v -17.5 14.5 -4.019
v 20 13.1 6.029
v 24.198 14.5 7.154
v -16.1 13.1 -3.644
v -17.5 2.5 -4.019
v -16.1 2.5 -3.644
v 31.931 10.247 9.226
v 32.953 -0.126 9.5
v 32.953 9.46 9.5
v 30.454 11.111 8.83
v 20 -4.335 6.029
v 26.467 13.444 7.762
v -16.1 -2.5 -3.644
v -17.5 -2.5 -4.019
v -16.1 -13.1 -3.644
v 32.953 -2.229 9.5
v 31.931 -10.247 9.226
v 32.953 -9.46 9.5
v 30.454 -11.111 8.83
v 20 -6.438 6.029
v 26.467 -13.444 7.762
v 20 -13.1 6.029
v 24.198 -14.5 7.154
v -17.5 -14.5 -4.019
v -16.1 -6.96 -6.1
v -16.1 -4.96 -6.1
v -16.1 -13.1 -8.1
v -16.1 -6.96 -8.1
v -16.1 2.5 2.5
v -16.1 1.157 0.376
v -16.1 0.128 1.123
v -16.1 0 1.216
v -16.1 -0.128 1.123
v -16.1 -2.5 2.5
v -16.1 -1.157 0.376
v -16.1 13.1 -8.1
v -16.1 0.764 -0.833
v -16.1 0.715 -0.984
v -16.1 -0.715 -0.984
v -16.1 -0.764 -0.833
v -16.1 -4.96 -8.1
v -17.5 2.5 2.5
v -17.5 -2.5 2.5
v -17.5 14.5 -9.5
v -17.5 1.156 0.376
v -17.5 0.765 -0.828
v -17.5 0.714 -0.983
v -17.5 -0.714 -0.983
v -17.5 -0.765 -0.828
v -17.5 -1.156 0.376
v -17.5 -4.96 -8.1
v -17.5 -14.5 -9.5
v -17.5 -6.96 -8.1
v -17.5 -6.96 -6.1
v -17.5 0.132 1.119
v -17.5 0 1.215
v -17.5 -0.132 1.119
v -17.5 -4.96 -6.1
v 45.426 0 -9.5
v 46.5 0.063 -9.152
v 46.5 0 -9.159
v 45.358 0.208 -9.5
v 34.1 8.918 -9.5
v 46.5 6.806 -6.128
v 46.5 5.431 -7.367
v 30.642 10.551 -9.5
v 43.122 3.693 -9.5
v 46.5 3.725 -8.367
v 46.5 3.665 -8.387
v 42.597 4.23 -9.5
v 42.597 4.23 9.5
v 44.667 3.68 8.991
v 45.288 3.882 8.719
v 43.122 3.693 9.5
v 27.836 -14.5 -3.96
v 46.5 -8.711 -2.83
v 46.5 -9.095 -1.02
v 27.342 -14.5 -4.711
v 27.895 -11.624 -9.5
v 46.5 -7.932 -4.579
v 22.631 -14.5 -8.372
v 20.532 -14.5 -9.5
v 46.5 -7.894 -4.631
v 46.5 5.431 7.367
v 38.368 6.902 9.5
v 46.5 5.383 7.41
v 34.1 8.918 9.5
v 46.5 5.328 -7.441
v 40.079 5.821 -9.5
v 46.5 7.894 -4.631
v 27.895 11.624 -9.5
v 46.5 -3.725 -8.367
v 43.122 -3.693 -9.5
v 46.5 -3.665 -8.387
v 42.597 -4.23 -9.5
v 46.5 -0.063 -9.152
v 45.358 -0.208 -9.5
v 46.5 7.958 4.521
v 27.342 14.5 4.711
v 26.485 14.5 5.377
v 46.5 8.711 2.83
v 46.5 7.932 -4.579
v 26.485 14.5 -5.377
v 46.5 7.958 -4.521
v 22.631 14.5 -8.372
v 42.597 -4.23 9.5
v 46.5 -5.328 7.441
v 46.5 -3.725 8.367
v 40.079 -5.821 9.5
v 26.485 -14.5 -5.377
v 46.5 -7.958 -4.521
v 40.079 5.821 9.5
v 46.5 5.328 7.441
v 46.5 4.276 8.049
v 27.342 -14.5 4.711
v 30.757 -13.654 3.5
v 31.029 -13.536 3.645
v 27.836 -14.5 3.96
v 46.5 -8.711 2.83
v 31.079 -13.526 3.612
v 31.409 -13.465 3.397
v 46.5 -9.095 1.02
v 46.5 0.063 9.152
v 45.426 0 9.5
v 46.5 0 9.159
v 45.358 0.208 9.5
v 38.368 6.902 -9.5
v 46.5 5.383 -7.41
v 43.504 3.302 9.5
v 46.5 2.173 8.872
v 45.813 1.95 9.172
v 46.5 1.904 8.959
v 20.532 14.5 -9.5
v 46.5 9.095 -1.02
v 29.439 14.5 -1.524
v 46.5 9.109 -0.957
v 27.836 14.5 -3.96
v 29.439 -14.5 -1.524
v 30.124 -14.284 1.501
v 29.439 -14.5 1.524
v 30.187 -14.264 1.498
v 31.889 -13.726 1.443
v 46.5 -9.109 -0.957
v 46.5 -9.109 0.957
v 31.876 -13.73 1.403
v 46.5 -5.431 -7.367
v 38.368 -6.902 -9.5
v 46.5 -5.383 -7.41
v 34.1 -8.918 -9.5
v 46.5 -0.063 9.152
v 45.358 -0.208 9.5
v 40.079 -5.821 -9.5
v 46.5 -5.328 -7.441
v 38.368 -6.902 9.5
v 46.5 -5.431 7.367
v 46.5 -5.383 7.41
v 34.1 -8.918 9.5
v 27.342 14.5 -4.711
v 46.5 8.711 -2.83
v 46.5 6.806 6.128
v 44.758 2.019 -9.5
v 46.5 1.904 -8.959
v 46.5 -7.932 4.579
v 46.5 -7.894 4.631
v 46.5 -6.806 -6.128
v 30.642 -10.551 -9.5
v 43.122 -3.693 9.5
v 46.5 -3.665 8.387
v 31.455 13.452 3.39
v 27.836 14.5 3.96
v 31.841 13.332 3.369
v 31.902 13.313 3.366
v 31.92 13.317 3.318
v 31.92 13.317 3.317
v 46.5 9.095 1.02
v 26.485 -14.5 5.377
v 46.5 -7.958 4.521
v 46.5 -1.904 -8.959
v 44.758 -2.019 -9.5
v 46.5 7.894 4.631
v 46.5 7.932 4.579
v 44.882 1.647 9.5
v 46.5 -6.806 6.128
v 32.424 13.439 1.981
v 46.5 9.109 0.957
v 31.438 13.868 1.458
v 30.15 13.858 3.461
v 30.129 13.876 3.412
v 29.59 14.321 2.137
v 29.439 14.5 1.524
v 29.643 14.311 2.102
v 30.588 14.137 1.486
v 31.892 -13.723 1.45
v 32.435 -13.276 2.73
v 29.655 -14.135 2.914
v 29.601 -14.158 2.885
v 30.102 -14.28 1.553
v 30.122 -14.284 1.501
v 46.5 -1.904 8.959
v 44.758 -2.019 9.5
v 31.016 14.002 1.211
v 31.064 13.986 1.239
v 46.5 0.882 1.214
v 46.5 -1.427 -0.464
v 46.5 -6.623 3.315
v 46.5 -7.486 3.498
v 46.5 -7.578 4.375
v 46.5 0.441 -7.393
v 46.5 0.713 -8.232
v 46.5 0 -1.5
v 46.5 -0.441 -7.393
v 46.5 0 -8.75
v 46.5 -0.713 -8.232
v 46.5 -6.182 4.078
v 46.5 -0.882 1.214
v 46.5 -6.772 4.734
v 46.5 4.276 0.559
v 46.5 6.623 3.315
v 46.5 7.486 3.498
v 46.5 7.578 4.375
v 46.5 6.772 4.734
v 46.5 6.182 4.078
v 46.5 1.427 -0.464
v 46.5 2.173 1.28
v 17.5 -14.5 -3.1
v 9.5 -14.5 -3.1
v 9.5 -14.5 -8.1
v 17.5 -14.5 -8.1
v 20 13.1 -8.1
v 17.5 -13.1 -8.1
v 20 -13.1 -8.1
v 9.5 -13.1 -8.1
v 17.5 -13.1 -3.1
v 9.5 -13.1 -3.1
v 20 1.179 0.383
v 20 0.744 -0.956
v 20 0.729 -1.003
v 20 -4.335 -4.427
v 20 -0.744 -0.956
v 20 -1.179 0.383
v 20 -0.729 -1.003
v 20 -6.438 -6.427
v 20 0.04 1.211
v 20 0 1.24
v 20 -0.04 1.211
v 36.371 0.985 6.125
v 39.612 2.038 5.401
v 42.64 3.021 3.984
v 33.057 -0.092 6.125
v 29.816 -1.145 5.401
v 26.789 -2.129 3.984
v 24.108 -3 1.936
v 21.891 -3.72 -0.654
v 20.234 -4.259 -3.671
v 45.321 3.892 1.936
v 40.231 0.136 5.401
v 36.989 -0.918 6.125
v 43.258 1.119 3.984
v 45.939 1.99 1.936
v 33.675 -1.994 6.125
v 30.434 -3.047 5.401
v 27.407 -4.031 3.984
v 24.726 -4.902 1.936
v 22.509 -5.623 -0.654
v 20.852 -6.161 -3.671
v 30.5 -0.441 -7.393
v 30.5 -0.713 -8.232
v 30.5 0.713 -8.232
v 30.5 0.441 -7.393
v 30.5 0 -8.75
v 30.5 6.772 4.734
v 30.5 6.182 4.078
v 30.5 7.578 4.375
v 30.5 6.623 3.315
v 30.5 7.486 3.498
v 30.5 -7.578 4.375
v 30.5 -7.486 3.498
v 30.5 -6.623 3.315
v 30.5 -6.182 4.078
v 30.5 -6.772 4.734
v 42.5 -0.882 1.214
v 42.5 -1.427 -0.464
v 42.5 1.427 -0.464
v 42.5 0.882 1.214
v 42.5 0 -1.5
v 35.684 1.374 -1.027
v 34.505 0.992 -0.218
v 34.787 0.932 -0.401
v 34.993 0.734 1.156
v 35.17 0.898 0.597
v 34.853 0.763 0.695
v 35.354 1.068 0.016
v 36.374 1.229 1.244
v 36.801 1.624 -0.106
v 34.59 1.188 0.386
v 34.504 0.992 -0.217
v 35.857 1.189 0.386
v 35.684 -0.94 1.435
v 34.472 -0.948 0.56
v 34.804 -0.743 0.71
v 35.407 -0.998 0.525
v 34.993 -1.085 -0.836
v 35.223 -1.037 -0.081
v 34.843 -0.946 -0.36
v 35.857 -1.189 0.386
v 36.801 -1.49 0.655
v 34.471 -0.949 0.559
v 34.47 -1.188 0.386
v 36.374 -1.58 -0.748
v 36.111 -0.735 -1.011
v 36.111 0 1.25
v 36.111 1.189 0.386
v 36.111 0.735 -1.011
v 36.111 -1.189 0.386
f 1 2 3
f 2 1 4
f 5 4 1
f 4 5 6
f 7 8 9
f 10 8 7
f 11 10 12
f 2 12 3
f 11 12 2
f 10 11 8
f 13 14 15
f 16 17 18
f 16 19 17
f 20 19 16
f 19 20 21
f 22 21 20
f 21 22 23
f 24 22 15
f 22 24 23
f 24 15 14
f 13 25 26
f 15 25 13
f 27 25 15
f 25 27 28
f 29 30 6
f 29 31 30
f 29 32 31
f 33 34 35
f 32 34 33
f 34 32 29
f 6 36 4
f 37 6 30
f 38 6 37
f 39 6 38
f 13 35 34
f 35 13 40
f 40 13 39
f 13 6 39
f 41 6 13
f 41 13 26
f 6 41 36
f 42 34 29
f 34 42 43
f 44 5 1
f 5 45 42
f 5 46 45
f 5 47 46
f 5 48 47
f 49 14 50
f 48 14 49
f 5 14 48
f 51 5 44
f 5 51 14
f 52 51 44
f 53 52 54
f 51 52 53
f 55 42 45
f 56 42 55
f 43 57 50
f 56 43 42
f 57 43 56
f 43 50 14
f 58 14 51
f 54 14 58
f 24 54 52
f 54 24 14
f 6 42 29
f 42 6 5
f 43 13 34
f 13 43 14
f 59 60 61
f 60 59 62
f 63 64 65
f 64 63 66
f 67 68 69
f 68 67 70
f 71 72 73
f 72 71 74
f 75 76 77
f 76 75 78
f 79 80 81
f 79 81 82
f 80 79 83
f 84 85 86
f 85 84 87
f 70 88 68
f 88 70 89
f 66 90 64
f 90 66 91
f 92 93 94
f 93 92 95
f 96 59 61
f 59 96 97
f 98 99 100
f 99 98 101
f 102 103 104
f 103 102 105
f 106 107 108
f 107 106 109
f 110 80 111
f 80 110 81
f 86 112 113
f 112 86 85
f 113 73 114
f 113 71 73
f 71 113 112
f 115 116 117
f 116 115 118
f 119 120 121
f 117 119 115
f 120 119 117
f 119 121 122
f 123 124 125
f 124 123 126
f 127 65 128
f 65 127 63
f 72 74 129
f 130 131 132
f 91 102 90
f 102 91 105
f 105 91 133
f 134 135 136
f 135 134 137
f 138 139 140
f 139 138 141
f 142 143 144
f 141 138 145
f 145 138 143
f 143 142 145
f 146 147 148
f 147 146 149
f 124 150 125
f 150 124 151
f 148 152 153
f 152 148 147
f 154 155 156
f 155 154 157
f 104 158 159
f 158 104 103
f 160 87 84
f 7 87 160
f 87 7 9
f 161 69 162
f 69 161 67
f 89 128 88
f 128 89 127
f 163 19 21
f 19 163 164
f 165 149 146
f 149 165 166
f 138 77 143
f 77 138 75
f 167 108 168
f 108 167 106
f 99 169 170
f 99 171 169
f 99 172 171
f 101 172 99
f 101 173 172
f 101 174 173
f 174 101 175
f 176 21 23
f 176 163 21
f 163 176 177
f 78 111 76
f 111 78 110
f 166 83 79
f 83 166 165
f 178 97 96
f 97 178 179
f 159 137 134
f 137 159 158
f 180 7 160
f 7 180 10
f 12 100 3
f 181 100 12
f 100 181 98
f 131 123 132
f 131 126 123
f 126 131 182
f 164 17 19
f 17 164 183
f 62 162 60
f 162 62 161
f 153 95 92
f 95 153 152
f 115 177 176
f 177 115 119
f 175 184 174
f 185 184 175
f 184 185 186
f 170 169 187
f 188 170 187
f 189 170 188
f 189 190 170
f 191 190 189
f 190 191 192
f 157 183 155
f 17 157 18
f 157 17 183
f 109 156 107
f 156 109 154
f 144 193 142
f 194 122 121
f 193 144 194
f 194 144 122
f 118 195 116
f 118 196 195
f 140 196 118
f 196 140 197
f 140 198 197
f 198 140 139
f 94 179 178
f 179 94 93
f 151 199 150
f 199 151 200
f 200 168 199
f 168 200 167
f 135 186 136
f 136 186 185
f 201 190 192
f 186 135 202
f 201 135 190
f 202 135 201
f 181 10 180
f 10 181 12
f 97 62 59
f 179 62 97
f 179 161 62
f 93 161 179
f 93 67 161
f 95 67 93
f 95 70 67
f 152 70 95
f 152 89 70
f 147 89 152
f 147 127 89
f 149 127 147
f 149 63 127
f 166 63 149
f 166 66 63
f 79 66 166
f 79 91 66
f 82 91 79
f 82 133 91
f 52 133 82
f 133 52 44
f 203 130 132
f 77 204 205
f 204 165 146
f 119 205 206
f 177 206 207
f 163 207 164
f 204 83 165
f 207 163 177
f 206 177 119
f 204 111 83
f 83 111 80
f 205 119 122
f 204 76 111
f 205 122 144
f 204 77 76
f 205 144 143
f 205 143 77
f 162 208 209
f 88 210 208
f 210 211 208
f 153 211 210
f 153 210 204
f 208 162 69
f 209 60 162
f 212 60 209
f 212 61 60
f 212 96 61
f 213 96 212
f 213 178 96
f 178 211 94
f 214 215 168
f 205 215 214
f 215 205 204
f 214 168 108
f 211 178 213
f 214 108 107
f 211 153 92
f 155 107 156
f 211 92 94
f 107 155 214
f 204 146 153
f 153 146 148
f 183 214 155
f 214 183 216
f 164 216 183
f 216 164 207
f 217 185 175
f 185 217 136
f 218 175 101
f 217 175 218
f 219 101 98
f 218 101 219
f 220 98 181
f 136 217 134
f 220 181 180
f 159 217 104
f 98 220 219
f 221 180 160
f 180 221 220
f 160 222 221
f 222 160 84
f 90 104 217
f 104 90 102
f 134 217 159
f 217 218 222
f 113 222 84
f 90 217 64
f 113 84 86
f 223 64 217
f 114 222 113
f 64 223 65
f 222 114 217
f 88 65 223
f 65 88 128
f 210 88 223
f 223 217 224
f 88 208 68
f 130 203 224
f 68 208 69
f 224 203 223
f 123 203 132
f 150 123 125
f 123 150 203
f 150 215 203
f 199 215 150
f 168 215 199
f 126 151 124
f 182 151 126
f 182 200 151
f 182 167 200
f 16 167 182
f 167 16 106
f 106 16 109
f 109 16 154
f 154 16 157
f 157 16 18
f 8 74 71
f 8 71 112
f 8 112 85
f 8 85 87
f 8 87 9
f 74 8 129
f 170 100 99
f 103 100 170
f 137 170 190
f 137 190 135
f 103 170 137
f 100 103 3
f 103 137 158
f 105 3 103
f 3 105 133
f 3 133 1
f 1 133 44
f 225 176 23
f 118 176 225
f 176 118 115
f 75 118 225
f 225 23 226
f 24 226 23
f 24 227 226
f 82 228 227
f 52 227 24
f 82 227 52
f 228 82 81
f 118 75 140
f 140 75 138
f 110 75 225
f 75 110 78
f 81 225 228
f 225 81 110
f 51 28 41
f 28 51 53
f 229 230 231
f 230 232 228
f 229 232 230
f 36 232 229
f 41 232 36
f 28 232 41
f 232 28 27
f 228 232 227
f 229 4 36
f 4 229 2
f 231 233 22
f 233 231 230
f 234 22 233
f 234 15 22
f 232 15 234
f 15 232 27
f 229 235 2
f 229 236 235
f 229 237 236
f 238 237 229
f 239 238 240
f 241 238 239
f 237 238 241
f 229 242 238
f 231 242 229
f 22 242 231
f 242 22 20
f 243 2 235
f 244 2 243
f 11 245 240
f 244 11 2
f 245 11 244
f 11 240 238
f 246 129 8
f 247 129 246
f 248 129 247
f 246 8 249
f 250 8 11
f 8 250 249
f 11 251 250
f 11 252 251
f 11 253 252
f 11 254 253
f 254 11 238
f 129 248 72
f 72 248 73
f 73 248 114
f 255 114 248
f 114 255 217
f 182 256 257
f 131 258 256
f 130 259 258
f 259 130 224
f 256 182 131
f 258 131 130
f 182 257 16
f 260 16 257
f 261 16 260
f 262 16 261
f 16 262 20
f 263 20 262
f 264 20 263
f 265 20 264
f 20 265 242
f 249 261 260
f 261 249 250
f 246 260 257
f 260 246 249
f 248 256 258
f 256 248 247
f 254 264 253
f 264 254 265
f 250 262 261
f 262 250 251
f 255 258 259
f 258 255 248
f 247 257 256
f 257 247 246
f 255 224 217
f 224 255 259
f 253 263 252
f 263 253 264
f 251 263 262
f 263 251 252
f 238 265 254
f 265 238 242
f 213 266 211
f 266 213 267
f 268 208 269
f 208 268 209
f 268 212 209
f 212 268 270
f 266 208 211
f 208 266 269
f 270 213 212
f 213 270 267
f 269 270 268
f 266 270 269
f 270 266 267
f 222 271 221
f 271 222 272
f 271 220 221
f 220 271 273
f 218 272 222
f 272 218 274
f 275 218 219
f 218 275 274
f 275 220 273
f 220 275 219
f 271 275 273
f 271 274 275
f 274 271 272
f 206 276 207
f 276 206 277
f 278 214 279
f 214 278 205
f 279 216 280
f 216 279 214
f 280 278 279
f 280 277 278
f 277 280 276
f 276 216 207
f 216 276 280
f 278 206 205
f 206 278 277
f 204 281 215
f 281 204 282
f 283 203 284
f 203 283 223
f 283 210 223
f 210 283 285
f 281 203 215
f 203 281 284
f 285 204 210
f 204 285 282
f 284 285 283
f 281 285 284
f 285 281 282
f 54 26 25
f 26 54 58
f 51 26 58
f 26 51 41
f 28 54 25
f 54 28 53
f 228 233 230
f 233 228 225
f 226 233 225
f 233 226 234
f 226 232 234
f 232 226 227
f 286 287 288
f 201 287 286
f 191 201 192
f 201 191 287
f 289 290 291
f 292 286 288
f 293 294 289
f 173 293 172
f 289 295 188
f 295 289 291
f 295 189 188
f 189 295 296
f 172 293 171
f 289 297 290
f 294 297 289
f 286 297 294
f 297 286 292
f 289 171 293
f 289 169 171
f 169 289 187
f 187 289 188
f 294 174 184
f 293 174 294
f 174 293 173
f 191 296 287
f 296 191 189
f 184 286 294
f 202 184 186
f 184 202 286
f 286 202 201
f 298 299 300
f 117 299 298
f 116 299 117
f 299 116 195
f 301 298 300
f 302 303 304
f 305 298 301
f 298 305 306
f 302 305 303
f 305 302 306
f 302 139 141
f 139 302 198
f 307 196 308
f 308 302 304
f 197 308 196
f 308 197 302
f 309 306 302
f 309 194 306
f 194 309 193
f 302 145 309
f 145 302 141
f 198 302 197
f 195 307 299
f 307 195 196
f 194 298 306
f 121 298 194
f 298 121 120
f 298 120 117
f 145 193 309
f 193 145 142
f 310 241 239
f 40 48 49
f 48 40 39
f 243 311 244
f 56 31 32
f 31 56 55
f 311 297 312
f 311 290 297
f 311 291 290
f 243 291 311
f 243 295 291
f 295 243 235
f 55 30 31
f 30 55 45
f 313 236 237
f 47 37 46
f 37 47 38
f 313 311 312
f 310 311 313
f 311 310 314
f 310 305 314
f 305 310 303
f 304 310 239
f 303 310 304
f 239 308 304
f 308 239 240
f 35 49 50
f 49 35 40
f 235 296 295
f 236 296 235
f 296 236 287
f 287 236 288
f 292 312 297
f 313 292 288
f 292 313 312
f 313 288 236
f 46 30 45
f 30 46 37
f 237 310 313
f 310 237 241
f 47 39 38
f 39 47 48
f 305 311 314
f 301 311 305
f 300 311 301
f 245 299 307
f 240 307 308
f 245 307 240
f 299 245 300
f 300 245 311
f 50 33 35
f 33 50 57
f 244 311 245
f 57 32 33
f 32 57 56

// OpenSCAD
// Author: Peter Withers
// Initial date: 2014-03-16 18:36

chordRatio = 0.16;
fuseRatio = 0.68;
leadingEdgeRadio = 0.12;
vTailRatio = 0.16;
hTailRatio = 0.26;
rudderChordRatio = 0.05; // todo: check this value 
elevatorChordRatio = 0.065; // todo: check this value

carbonfiberLength = 1000;
span = carbonfiberLength / (1 + fuseRatio - rudderChordRatio);
dihedral = 10;
sweep = 20;
rudderChord = span * rudderChordRatio;
elevatorChord = span * elevatorChordRatio;
boomLength = span * fuseRatio - rudderChord; // todo: this must subtract the rudder length
wingLength = span / 2;
rootChord = span * chordRatio;
leadingEdgeOffset = span * leadingEdgeRadio;
tailWidth = span * hTailRatio;
tailHeight = span * vTailRatio;

echo("span", span);
echo("dihedral", dihedral);
echo("sweep", sweep);
echo("root chord", rootChord);
echo("boom length", boomLength);
echo("total length", rudderChord + boomLength);
echo("leading edge from tip", leadingEdgeOffset);
echo("tail width", tailWidth);
echo("tail height", tailHeight);
echo("rudder chord", rudderChord);
echo("elevator chord", elevatorChord);

echo("boom plus span (which should be the carbon fibre lenght)", boomLength+span);

wallThickness = 1.4;
totalHeight = 19;
motorHoleCount = 3;
motorHoleOffsetRadius = 8.0;// todo: this might be too small, maybe .5 more is good
motorHoleDiameter = 1.5;
motorHoleDepth = 17;
//motorZpos = 5; // correct this value
boardWidth = 25 + 4;
boardLength = 33 + 2;
cowlingTipRadius = 9;
cowlingTailRadius = boardWidth*0.65;
cowlingLength = 30;
carbonfiberDiameter = 2.5; // todo: consider making this thicker


module makeMainShape(shrinkValue){
	translate([shrinkValue/2,0,shrinkValue])
	cube([boardLength-shrinkValue,boardWidth-shrinkValue*2,totalHeight],true);
	rotate([0,90,0])translate([0,0,(boardLength+cowlingLength)/2-1-shrinkValue])
	intersection(){
		cylinder(cowlingLength+1, cowlingTailRadius-shrinkValue, cowlingTipRadius-shrinkValue,true);
		translate([-shrinkValue,0,0]) cube([totalHeight,boardWidth-shrinkValue*2,cowlingLength-shrinkValue*2],true);
	}
}

module makeMountHoles(){
	// antenna hole
	translate([-boardLength,-boardWidth*0.24,-totalHeight/2+wallThickness])
	cube([boardLength,2,2]);
	// battery cable hole
	// todo: make this angled so that the wire comes out at the correct location on the board while maintining the current motor entry point
	// todo: make this curved so that the wire does not get bent at an angle 
	// todo: make sure this channel does not interfere with the boom hole
	translate([boardLength/2,-boardWidth*0.25,totalHeight*0.15-totalHeight*0.5])
		rotate(18,[0,0,1]){ 
			difference(){
				cube([boardLength,2,totalHeight*1]);
				translate([cowlingLength/1.6,1,-totalHeight*0.2])rotate(90,[1,0,0]) cylinder(5,cowlingLength/1.8,cowlingLength/1.8,true);
			}
		}
	// motor cable hole
	translate([boardLength/2-8,-boardWidth,-totalHeight/2+wallThickness])
	cube([8,boardWidth,5]);
	// motor holes
	translate([cowlingLength+boardLength/2,0,0]) rotate([0,90,0]){
		cylinder(h = 10, r=motorHoleDiameter, center = true);
		for (holeIndex = [0 : motorHoleCount]){
			rotate(holeIndex * 360 / motorHoleCount, [0, 0, 1])
			translate([motorHoleOffsetRadius,0,-motorHoleDepth/2])
			cylinder(h = motorHoleDepth, r=motorHoleDiameter/2, center = true);
		}
	}
}
module makeCarbonFiberRodMountHoles(){
	translate([(boardLength+cowlingLength)/1.8,0,0]){
		rotate(270,[0,1,0])cylinder(boomLength, carbonfiberDiameter/2, false);
		for (wingIndex = [90-dihedral,dihedral-90]){
			rotate(90,[0,0,1])rotate([-sweep,wingIndex,0])
				translate([0,0,carbonfiberDiameter/2])
					cylinder(wingLength, carbonfiberDiameter/2, false);
		}
	}
//cylinder(h = 10, r=motorHoleDiameter, center = true);
//carbonfiberDiameter
//boomLength
//wingLength
//dihedral
// sweep
}

module makeHousing(){
	intersection(){
		union(){
			translate([0,0,-totalHeight]) rotate([0,-15,0])
				cube([(boardLength+cowlingLength)*2,boardWidth*2,totalHeight*2],true);
			translate([wallThickness/2-boardLength/2,0,-totalHeight*0.5+carbonfiberDiameter])
				// todo: this is not strong enough to print
				cube([wallThickness,carbonfiberDiameter*2,totalHeight],true);
		}
		difference(){
			makeMainShape(0);
			union(){
				difference(){
					makeMainShape(wallThickness);
					translate([boardLength,0,0])
						cube([cowlingLength,boardWidth+2,totalHeight+2],true);
				}
				makeMountHoles();
makeCarbonFiberRodMountHoles();			
			}
		}
	}
}
makeHousing();
%makeCarbonFiberRodMountHoles();
